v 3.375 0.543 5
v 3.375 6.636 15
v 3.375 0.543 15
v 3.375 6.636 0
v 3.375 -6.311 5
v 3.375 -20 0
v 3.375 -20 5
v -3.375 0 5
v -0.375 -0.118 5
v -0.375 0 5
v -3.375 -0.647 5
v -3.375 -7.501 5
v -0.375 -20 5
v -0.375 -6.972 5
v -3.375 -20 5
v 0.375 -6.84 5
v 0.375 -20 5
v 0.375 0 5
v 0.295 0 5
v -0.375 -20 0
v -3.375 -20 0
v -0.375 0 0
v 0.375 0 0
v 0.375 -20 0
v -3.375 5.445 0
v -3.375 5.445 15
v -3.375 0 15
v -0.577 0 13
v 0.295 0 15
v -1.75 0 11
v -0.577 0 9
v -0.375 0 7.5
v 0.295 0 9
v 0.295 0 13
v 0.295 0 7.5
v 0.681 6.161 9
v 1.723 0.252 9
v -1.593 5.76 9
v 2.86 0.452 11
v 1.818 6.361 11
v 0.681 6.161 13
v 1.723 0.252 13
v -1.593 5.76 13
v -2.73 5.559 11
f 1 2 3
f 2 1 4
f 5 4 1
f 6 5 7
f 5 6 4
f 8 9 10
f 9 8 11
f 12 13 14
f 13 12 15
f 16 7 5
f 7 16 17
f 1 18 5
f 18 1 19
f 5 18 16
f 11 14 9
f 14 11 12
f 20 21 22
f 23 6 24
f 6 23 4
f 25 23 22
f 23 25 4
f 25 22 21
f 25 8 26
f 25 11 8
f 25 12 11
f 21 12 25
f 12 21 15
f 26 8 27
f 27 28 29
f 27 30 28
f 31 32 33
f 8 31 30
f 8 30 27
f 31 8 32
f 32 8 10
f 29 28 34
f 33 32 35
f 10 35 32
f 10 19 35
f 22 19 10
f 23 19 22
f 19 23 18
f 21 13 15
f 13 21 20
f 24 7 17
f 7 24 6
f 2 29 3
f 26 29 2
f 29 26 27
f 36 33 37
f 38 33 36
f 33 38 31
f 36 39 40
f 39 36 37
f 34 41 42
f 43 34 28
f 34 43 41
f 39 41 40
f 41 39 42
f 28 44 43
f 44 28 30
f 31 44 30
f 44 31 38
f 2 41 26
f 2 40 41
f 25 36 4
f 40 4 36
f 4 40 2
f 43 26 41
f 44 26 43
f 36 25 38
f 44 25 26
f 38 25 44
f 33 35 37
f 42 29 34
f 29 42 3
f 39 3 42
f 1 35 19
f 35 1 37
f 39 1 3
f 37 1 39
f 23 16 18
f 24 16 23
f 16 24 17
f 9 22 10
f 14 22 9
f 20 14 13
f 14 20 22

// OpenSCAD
da6 = 1 / cos(180 / 6) / 2;

fan_hole_distance = 50;
fan_angle = 10;
fan_side_trim_amount = 0.75;

finger_thickness = 3;
finger_width = 5; // width inside the binder/bulldog clip
finger_length = 20;
finger_gap = .75;
total_width = finger_thickness * 2 + finger_gap;

screw_size = 4;
wall_thickness = 2;

//angled_edges();
module angled_edges() {
  rotate([0,10,0])
    translate([-total_width,-finger_length,0])
      cube([total_width,finger_length*2, finger_length], center = true);
}

//fan_hole();
module fan_hole() {

  rotate([0,0,fan_angle]) {
    translate([0,0,screw_size/2 + wall_thickness*2]) {
      rotate([90])
        cylinder(r = da6 * screw_size, h = total_width * 2, $fn = 6, center= true);

    }

    //if (fan_angle > 88) assign(fan_side_trim_amount = 0);
    translate([-total_width*4,total_width/2 - fan_side_trim_amount,-total_width])
      cube([total_width*8,total_width,total_width*4]);

    translate([-total_width,0 - total_width * 1.5,0])
      cube([total_width*2,total_width,total_width* 2]);
  }
}

main();
module main() {
  difference() {
    union() {
      translate([-total_width / 2,-finger_length,0])
        cube([total_width, finger_length,finger_width]);

      translate([-total_width / 2,0,0])
        cube([total_width, total_width,finger_width + wall_thickness * 3 + screw_size]);
    }

    translate([-finger_gap / 2,-finger_length*2,-finger_width / 2])
      cube([finger_gap,finger_length * 2,finger_width * 2]);

    translate([0,total_width / 2,finger_width])
      fan_hole();

    /*
    translate([0,total_width / 2,finger_width + screw_size/2 + wall_thickness * 2])
      rotate([0,0,fan_angle]) {
        rotate([90])
          cylinder(r = da6 * screw_size, h = 100, $fn = 6, center= true);

        translate([-total_width/2])
          cube([]);
      }
    */
  }


/*
  translate([finger_gap / 2,-finger_length,0])
    cube([finger_thickness, finger_length, finger_width]);

  translate([-finger_thickness - finger_gap / 2,-finger_length,0])
    cube([finger_thickness, finger_length, finger_width]);

  mount_width = finger_thickness + finger_gap + finger_thickness;
  translate([-finger_thickness,0,0])
      cube([mount_width, mount_width, finger_width]);

  translate([-screw_size/2 - wall_thickness,0,0])
      cube([screw_size + wall_thickness * 2,screw_size + wall_thickness * 2,screw_size + wall_thickness * 3]);
      */

/*
  translate([])
    mounting_hole();
*/
}

//mounting_hole();
module mounting_hole() {
  difference() {
    translate([-screw_size/2 - wall_thickness,0,0])
        cube([screw_size + wall_thickness * 2,screw_size + wall_thickness * 2,screw_size + wall_thickness * 3]);

    translate([0,0,screw_size/2 + wall_thickness * 2])
      rotate([90])
        cylinder(r = da6 * screw_size, h = 100, $fn = 6, center= true);
  }
}


/*
bearing_outer = 10;
bearing_inner = 3;
bearing_width = 4;
nut_size = 6;

bearing_outer = 22;
bearing_inner = 8;
bearing_width = 7;
nut_size = 14; // printed 13.5

bearing_clearance = 2;

spool_width = 73;
spool_diam = 204;
spool_below = round(bearing_outer / 10) + 1;

length = 90;
thickness = 5;

screw_size = bearing_inner;
height = bearing_outer + bearing_clearance + spool_below;

total_width = spool_width + thickness * 2;

da8 = 1 / cos(180 / 8) / 2;
da12 = 1 / cos(180 / 12) / 2;

difference() {
  linear_extrude(height = height, convexity = 5) difference() {
    minkowski() {
      square([spool_width, length - thickness * 2], center = true);
      circle(thickness);
    }
    square([spool_width, length - thickness * 2], center = true);
  }
  for(end = [1, -1]) translate([0, end * (length / 2 - thickness - bearing_outer / 2 - 1), bearing_outer / 2 + spool_below]) rotate([90, 0, 90]) {
    cylinder(r = screw_size * da6, h = spool_width + thickness * 3,center = true, $fn = 6);
    for(side = [0, 1]) mirror([0, 0, side]) translate([0, 0, spool_width / 2 + thickness - 2]) cylinder(r = nut_size / 2, h = spool_width + thickness * 3,center = false, $fn = 6);    
  }

  translate([0,0,total_width / 2 + height]) rotate([90,0,0]) cylinder(r=total_width / 2 + bearing_outer / 2, h=length + 2, center= true);
  translate([-total_width / 2 - 1, 0, length / 2 + height]) rotate([0,90,0]) cylinder(r=length / 2 + bearing_outer / 2, h=total_width + 2);
}

% for(end = [1, -1]) translate([0, end * (length / 2 - thickness - bearing_outer / 2 - 1), bearing_outer / 2 + spool_below]) rotate([90, 0, 90]) {
  for(side = [0, 1])
    mirror([0, 0, side])
    translate([0, 0, spool_width / 2 + thickness - bearing_width - thickness - 1])
      difference() {
        cylinder(r = bearing_outer / 2, h=bearing_width);
        cylinder(r = bearing_inner / 2, h=bearing_width*4, center=true);
      }
}
*/
